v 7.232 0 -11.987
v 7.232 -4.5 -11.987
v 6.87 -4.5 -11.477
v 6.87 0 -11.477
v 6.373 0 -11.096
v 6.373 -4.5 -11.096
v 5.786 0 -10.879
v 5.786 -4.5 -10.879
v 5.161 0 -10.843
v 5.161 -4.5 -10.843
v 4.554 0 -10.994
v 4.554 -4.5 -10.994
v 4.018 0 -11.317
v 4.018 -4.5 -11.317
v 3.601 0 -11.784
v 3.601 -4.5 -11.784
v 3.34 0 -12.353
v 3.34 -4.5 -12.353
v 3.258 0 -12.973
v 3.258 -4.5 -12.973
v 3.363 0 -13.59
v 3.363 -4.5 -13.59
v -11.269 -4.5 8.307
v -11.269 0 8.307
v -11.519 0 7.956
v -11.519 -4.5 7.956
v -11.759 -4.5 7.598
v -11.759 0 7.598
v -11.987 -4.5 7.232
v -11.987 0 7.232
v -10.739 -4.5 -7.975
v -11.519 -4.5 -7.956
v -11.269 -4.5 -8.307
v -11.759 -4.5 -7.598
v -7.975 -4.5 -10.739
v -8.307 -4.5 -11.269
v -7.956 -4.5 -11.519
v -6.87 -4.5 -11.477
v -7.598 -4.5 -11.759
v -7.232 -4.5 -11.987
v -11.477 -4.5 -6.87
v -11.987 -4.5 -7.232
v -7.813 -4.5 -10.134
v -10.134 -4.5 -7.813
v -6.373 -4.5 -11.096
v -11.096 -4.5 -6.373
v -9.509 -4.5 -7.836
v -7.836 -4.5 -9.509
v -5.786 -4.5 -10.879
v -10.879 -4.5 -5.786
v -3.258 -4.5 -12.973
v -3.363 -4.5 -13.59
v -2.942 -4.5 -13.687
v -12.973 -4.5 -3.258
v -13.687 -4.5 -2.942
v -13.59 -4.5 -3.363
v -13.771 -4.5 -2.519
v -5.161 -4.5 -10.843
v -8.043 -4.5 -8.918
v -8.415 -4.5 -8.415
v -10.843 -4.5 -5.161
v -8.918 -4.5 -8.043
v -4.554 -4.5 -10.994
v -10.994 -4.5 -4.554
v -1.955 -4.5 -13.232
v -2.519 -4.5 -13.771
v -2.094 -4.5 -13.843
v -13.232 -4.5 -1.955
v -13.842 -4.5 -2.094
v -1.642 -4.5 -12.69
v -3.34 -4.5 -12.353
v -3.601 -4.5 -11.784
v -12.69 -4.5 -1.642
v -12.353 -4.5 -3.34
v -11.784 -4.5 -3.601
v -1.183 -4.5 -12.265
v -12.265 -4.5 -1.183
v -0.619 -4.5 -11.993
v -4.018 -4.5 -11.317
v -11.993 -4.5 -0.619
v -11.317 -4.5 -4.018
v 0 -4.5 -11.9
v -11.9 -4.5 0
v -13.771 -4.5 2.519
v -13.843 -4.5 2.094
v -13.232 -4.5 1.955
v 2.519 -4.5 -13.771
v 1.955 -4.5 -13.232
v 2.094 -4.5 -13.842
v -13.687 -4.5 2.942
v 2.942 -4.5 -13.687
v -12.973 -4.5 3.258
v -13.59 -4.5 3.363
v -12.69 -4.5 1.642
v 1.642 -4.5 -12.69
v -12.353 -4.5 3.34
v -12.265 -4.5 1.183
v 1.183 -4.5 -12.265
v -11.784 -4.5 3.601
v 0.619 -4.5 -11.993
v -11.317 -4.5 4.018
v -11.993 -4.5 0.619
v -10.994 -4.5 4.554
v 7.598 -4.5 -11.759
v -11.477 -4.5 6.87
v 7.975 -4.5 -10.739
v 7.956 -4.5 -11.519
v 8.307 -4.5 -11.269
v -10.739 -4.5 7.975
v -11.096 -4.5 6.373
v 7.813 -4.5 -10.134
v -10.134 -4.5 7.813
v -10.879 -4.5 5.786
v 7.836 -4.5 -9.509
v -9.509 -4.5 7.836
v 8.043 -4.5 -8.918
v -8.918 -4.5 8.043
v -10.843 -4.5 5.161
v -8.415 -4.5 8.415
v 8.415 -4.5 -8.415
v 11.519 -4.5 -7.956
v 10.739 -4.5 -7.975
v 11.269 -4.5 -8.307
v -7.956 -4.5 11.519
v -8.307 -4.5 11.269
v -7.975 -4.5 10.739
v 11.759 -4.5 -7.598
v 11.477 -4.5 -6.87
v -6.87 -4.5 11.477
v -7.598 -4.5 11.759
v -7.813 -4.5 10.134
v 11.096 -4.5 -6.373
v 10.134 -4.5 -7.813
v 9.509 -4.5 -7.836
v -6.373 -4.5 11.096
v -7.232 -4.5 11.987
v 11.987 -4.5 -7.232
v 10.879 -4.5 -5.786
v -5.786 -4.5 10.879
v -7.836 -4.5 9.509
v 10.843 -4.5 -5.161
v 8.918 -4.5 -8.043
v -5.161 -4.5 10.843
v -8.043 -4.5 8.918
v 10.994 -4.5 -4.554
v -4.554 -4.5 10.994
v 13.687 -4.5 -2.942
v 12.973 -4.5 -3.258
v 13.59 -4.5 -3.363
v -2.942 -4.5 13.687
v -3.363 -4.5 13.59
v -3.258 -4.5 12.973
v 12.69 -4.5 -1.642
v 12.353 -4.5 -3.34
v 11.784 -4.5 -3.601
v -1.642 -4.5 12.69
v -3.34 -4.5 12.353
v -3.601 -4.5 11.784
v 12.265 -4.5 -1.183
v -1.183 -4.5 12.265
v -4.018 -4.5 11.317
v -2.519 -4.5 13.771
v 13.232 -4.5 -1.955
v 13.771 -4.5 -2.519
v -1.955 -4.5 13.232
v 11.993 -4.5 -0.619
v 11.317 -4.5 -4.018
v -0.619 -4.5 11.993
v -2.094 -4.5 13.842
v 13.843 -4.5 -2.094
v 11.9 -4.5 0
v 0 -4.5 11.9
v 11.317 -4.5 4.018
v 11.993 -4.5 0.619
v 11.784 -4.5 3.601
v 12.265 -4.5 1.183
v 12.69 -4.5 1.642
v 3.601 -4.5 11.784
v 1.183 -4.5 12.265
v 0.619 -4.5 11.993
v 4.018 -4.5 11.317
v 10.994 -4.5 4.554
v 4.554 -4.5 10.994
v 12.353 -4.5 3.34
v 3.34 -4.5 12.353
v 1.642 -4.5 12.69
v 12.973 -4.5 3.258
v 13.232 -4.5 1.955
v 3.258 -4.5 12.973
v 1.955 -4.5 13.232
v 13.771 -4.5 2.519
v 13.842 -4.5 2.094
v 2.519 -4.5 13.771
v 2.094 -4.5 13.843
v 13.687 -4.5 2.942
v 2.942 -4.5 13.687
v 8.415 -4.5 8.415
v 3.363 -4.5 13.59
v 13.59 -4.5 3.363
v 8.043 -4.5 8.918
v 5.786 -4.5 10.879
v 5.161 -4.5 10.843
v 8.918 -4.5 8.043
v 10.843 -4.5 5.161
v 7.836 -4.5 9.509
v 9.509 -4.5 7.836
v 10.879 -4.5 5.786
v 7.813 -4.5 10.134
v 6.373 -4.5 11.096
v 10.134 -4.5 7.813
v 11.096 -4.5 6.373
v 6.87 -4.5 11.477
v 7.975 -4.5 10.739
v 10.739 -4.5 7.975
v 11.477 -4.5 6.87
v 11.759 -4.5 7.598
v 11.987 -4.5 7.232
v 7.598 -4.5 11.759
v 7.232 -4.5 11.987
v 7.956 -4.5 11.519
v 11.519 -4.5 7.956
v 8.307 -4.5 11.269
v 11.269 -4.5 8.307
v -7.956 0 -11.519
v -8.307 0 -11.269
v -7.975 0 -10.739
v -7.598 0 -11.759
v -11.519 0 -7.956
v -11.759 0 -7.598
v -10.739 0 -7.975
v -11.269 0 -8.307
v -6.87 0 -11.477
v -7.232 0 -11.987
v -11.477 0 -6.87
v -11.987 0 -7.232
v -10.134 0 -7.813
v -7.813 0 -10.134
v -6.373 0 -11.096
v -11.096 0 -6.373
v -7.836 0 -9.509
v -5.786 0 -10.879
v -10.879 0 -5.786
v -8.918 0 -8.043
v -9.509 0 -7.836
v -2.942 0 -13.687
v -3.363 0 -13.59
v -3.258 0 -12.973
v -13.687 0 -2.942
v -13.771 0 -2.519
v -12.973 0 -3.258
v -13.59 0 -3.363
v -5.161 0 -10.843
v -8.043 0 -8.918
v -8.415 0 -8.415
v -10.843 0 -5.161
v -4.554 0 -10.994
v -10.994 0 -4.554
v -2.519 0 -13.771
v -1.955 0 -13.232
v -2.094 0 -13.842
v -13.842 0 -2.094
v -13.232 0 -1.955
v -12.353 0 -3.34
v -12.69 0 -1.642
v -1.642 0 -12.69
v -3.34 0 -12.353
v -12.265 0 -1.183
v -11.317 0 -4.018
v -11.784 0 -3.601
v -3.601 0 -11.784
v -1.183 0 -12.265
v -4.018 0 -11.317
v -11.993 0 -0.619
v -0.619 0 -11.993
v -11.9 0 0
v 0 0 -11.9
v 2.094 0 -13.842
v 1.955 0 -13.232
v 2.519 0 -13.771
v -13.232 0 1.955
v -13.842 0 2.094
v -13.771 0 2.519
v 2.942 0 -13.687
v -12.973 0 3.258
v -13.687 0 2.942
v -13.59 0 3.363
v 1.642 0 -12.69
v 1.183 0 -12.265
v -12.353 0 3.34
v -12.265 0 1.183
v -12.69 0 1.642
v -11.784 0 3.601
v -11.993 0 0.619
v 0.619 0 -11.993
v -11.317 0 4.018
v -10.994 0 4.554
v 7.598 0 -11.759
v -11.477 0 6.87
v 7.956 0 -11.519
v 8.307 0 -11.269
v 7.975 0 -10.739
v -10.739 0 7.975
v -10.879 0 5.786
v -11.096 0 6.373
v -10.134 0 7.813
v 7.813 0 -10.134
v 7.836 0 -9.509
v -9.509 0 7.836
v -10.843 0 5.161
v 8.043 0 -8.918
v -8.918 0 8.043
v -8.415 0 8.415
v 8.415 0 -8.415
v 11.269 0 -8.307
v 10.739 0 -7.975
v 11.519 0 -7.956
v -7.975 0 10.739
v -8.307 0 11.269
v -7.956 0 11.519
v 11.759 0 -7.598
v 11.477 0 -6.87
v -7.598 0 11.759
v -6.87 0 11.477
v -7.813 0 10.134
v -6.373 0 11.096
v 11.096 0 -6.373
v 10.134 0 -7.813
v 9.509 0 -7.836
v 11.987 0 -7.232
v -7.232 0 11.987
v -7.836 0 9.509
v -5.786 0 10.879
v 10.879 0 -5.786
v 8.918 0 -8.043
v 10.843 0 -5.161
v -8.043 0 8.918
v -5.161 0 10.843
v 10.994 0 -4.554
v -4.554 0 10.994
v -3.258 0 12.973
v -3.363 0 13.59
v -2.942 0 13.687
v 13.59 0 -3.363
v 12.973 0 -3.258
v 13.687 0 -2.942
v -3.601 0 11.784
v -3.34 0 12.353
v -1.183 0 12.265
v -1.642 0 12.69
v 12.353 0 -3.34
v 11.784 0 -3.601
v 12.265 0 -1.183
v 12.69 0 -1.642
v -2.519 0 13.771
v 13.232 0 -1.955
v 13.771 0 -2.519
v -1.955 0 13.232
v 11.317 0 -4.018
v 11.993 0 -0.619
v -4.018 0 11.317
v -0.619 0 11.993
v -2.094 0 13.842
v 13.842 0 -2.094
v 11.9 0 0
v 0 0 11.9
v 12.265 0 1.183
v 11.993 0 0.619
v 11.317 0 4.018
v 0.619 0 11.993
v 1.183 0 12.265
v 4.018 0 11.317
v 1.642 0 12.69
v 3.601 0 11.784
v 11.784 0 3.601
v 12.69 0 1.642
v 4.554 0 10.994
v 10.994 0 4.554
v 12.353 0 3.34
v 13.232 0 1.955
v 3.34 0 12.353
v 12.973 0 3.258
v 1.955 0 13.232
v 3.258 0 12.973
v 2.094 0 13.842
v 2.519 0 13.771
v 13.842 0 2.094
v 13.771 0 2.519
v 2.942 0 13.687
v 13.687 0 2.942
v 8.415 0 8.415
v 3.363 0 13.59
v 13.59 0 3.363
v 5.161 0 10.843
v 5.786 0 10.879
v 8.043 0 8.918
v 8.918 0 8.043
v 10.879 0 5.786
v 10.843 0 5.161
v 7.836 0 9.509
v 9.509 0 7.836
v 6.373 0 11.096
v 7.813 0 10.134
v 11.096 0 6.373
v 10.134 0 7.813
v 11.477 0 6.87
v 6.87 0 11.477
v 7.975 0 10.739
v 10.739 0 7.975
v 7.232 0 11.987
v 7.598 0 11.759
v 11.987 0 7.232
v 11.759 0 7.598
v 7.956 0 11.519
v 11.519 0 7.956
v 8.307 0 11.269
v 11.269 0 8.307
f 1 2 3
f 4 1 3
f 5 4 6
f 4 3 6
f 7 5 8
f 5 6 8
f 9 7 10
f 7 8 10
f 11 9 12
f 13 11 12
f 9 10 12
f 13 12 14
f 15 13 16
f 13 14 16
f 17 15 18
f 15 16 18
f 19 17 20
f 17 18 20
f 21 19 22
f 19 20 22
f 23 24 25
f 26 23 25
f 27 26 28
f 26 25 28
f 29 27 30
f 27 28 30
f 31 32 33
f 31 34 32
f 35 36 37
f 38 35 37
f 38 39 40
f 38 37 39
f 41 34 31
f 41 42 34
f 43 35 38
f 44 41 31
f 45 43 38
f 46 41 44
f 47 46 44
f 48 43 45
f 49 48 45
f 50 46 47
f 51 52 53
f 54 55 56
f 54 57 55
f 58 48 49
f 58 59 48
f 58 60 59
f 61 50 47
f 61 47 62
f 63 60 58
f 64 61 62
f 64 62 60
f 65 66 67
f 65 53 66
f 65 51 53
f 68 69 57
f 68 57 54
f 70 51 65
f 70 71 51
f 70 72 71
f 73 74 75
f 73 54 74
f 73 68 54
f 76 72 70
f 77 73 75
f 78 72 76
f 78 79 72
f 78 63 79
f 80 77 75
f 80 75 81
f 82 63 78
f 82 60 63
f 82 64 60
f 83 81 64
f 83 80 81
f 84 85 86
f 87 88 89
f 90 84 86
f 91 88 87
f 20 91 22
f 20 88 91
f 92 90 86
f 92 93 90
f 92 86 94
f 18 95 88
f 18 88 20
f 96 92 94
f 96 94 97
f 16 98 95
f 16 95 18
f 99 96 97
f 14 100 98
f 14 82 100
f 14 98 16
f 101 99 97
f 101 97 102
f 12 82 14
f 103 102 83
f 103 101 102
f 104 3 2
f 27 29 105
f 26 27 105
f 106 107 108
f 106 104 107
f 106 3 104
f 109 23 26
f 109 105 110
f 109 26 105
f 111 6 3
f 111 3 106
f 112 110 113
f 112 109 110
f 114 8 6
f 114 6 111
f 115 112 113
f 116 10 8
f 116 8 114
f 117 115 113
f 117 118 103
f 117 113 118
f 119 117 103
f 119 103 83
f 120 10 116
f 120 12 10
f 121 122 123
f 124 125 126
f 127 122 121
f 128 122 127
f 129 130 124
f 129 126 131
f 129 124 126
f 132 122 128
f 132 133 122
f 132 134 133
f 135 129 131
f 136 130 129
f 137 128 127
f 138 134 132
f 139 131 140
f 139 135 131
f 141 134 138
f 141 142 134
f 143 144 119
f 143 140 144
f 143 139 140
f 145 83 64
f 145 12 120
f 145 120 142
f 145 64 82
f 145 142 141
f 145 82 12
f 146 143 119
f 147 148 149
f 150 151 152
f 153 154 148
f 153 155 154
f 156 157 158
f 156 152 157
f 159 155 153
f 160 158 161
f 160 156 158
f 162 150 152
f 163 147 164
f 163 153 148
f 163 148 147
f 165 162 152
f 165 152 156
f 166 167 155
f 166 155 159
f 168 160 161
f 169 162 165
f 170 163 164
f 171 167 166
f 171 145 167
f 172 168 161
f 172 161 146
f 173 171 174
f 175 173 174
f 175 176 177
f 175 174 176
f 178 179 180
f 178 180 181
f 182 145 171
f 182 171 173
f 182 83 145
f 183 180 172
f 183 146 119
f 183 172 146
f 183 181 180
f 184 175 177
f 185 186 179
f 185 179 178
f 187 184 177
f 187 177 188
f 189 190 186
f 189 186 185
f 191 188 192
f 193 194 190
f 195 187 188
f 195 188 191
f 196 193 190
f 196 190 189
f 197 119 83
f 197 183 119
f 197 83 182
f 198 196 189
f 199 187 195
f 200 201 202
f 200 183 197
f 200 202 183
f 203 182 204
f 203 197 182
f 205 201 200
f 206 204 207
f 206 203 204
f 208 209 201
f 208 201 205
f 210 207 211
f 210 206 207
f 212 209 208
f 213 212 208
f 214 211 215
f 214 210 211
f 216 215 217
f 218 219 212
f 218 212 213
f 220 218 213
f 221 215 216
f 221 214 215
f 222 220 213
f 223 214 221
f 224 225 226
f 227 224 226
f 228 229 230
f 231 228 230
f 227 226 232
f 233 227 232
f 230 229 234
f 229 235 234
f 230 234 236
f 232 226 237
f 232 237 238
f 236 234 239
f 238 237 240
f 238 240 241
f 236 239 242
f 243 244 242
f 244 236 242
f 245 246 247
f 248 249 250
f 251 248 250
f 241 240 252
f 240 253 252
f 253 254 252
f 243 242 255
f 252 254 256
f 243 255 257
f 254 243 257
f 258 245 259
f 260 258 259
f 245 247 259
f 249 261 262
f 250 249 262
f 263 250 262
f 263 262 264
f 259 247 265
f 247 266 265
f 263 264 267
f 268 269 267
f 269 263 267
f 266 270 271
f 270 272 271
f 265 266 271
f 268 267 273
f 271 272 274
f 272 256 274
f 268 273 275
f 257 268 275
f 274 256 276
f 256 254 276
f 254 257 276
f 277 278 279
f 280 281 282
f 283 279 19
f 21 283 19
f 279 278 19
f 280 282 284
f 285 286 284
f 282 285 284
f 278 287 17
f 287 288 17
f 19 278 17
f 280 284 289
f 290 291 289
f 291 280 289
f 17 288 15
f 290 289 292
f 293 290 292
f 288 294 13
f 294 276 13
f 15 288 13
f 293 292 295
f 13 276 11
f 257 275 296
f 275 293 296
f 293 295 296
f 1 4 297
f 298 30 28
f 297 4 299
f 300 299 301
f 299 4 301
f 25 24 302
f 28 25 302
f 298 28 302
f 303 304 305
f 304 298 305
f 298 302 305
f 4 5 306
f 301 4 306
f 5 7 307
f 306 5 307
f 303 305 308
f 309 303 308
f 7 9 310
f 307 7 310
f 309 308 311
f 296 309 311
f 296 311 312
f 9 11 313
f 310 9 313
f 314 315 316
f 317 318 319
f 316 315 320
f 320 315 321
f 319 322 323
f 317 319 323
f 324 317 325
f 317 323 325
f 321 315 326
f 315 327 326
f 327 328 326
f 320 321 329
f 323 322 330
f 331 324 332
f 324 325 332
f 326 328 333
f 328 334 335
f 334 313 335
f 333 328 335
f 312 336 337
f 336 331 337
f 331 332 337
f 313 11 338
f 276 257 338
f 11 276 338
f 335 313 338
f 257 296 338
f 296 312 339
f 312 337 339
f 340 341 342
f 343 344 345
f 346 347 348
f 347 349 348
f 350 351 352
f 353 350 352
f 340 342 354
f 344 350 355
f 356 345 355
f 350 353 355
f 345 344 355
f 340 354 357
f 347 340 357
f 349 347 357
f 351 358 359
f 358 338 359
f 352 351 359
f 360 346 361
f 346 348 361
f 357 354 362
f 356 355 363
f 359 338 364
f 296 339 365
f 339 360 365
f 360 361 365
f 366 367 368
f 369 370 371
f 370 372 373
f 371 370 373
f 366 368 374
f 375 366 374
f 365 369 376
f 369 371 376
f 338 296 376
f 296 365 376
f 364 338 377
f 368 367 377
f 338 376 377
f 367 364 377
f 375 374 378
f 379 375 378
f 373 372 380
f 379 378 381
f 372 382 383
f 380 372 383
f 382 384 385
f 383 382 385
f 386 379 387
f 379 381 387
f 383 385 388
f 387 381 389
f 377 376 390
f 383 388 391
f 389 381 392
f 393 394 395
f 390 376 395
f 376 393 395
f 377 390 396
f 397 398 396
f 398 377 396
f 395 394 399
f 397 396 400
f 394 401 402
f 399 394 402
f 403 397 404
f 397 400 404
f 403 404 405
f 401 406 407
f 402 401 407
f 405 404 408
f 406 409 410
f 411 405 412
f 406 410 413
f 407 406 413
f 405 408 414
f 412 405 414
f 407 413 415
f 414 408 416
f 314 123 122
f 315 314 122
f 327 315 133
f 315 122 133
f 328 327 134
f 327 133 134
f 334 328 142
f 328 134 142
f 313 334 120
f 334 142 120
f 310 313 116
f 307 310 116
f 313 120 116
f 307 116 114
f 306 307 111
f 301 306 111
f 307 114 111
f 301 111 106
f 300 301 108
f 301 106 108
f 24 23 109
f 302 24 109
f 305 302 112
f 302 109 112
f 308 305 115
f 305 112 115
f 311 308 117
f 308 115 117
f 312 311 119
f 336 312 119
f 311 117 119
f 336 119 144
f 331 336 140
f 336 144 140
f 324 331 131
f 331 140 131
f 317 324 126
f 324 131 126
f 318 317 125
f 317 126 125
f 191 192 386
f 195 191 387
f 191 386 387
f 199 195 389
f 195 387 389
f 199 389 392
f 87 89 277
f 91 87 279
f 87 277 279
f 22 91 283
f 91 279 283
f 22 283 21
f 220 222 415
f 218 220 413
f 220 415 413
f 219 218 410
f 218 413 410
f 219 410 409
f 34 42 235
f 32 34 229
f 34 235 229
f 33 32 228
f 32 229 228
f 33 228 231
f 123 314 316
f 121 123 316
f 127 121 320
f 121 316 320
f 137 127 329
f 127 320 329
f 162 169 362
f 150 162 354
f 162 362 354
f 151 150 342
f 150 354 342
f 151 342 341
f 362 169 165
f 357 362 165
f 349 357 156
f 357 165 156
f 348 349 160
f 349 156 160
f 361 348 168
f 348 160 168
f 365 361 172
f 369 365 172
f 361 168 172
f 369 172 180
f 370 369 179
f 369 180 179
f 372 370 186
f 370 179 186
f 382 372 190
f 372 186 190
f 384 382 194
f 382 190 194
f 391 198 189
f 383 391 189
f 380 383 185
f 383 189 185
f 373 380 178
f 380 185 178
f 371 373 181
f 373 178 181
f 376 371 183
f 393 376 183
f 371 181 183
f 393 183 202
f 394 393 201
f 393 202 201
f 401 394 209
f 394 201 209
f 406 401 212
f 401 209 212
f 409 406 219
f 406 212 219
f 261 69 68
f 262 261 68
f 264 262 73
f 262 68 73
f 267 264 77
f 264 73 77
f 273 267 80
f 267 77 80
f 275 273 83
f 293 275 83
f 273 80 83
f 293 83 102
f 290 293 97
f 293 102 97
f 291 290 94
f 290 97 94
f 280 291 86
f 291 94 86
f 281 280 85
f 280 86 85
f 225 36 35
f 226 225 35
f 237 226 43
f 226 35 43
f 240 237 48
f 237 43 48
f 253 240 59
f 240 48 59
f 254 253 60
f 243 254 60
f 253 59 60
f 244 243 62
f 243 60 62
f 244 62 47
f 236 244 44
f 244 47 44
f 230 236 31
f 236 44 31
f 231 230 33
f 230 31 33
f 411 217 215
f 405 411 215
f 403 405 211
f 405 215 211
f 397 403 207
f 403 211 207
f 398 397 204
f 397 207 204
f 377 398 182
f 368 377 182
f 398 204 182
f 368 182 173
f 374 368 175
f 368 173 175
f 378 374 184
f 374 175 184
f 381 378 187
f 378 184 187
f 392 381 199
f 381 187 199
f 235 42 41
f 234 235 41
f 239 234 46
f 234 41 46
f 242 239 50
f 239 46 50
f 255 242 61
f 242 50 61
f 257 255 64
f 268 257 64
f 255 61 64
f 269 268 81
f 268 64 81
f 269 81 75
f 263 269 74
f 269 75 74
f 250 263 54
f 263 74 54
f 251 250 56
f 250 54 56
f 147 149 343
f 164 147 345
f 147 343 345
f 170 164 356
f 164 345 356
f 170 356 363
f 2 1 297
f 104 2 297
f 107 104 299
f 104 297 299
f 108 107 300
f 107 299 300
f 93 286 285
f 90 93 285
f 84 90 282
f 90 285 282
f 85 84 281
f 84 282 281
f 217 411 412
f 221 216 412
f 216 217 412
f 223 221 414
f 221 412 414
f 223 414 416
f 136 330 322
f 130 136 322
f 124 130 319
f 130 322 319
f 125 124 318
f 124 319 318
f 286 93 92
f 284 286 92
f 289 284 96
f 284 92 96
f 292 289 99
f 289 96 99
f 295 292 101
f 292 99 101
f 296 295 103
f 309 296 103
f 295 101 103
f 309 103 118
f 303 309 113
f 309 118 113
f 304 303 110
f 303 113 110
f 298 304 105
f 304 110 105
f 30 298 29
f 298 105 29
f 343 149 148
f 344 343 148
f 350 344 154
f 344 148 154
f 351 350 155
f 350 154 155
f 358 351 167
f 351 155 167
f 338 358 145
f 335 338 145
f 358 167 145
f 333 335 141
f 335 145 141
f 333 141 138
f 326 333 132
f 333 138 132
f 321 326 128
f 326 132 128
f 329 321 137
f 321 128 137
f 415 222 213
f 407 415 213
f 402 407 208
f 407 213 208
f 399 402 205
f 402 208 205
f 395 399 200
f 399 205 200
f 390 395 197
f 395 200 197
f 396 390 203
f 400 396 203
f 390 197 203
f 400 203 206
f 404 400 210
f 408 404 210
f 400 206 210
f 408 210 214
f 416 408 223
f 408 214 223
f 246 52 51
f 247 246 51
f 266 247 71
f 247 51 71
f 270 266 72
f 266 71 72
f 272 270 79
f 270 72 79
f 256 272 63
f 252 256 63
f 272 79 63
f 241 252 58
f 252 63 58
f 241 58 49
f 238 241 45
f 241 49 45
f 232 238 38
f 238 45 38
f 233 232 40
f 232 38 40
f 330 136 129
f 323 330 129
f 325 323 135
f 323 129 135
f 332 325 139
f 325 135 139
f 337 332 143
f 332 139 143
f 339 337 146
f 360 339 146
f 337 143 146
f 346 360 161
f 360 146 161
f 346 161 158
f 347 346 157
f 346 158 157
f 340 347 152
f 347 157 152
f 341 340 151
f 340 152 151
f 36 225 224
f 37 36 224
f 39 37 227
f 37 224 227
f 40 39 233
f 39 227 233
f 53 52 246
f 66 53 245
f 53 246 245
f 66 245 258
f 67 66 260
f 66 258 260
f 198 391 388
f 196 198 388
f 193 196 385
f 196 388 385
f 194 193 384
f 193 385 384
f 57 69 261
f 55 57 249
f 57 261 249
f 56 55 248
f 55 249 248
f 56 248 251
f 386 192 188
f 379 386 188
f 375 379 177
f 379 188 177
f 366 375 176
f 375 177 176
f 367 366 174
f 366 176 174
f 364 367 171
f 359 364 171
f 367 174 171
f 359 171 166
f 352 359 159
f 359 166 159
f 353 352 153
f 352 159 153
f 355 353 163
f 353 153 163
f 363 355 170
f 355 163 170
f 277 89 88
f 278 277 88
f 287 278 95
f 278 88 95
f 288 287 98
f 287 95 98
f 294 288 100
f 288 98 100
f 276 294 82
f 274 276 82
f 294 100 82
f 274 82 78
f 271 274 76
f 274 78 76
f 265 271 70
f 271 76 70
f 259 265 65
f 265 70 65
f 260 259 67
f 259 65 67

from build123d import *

# Parameters (mm, degrees)
F0_R            = 14
F1_DEPTH        = 4.5
F3_DEPTH        = 4.501
F3_COPIES_COUNT = 16


# Not quite as in the source:
# - a pattern or mirror of a feature is missing from the dataset's text; its kind, count and spacing are read off the source's solid


with BuildPart() as f1:
    # F0 (on Front) → F1 (new body)
    with BuildSketch(Plane.XZ):
        Circle(F0_R)
    extrude(amount=F1_DEPTH)

    # F2 (on face) → F3 (cut, through all)
    with BuildSketch(Plane.XZ.offset(4.5)):
        with BuildLine():
            ThreePointArc((2.0940854209, 13.8425), (0, 14), (-2.0940854209, 13.8425))
            ThreePointArc((-2.0940854209, 13.8425), (0, 11.9), (2.0940854209, 13.8425))
        make_face()
    f3 = extrude(amount=-F3_DEPTH, mode=Mode.SUBTRACT)

    # F3_copies: F3 ×16 about axis
    f3_copies_axis = Axis((0, 0, 0), (0, 1, 0))
    for i in range(1, F3_COPIES_COUNT):
        add(f3.rotate(f3_copies_axis, i * 360 / F3_COPIES_COUNT), mode=Mode.SUBTRACT)


solid = f1.part
